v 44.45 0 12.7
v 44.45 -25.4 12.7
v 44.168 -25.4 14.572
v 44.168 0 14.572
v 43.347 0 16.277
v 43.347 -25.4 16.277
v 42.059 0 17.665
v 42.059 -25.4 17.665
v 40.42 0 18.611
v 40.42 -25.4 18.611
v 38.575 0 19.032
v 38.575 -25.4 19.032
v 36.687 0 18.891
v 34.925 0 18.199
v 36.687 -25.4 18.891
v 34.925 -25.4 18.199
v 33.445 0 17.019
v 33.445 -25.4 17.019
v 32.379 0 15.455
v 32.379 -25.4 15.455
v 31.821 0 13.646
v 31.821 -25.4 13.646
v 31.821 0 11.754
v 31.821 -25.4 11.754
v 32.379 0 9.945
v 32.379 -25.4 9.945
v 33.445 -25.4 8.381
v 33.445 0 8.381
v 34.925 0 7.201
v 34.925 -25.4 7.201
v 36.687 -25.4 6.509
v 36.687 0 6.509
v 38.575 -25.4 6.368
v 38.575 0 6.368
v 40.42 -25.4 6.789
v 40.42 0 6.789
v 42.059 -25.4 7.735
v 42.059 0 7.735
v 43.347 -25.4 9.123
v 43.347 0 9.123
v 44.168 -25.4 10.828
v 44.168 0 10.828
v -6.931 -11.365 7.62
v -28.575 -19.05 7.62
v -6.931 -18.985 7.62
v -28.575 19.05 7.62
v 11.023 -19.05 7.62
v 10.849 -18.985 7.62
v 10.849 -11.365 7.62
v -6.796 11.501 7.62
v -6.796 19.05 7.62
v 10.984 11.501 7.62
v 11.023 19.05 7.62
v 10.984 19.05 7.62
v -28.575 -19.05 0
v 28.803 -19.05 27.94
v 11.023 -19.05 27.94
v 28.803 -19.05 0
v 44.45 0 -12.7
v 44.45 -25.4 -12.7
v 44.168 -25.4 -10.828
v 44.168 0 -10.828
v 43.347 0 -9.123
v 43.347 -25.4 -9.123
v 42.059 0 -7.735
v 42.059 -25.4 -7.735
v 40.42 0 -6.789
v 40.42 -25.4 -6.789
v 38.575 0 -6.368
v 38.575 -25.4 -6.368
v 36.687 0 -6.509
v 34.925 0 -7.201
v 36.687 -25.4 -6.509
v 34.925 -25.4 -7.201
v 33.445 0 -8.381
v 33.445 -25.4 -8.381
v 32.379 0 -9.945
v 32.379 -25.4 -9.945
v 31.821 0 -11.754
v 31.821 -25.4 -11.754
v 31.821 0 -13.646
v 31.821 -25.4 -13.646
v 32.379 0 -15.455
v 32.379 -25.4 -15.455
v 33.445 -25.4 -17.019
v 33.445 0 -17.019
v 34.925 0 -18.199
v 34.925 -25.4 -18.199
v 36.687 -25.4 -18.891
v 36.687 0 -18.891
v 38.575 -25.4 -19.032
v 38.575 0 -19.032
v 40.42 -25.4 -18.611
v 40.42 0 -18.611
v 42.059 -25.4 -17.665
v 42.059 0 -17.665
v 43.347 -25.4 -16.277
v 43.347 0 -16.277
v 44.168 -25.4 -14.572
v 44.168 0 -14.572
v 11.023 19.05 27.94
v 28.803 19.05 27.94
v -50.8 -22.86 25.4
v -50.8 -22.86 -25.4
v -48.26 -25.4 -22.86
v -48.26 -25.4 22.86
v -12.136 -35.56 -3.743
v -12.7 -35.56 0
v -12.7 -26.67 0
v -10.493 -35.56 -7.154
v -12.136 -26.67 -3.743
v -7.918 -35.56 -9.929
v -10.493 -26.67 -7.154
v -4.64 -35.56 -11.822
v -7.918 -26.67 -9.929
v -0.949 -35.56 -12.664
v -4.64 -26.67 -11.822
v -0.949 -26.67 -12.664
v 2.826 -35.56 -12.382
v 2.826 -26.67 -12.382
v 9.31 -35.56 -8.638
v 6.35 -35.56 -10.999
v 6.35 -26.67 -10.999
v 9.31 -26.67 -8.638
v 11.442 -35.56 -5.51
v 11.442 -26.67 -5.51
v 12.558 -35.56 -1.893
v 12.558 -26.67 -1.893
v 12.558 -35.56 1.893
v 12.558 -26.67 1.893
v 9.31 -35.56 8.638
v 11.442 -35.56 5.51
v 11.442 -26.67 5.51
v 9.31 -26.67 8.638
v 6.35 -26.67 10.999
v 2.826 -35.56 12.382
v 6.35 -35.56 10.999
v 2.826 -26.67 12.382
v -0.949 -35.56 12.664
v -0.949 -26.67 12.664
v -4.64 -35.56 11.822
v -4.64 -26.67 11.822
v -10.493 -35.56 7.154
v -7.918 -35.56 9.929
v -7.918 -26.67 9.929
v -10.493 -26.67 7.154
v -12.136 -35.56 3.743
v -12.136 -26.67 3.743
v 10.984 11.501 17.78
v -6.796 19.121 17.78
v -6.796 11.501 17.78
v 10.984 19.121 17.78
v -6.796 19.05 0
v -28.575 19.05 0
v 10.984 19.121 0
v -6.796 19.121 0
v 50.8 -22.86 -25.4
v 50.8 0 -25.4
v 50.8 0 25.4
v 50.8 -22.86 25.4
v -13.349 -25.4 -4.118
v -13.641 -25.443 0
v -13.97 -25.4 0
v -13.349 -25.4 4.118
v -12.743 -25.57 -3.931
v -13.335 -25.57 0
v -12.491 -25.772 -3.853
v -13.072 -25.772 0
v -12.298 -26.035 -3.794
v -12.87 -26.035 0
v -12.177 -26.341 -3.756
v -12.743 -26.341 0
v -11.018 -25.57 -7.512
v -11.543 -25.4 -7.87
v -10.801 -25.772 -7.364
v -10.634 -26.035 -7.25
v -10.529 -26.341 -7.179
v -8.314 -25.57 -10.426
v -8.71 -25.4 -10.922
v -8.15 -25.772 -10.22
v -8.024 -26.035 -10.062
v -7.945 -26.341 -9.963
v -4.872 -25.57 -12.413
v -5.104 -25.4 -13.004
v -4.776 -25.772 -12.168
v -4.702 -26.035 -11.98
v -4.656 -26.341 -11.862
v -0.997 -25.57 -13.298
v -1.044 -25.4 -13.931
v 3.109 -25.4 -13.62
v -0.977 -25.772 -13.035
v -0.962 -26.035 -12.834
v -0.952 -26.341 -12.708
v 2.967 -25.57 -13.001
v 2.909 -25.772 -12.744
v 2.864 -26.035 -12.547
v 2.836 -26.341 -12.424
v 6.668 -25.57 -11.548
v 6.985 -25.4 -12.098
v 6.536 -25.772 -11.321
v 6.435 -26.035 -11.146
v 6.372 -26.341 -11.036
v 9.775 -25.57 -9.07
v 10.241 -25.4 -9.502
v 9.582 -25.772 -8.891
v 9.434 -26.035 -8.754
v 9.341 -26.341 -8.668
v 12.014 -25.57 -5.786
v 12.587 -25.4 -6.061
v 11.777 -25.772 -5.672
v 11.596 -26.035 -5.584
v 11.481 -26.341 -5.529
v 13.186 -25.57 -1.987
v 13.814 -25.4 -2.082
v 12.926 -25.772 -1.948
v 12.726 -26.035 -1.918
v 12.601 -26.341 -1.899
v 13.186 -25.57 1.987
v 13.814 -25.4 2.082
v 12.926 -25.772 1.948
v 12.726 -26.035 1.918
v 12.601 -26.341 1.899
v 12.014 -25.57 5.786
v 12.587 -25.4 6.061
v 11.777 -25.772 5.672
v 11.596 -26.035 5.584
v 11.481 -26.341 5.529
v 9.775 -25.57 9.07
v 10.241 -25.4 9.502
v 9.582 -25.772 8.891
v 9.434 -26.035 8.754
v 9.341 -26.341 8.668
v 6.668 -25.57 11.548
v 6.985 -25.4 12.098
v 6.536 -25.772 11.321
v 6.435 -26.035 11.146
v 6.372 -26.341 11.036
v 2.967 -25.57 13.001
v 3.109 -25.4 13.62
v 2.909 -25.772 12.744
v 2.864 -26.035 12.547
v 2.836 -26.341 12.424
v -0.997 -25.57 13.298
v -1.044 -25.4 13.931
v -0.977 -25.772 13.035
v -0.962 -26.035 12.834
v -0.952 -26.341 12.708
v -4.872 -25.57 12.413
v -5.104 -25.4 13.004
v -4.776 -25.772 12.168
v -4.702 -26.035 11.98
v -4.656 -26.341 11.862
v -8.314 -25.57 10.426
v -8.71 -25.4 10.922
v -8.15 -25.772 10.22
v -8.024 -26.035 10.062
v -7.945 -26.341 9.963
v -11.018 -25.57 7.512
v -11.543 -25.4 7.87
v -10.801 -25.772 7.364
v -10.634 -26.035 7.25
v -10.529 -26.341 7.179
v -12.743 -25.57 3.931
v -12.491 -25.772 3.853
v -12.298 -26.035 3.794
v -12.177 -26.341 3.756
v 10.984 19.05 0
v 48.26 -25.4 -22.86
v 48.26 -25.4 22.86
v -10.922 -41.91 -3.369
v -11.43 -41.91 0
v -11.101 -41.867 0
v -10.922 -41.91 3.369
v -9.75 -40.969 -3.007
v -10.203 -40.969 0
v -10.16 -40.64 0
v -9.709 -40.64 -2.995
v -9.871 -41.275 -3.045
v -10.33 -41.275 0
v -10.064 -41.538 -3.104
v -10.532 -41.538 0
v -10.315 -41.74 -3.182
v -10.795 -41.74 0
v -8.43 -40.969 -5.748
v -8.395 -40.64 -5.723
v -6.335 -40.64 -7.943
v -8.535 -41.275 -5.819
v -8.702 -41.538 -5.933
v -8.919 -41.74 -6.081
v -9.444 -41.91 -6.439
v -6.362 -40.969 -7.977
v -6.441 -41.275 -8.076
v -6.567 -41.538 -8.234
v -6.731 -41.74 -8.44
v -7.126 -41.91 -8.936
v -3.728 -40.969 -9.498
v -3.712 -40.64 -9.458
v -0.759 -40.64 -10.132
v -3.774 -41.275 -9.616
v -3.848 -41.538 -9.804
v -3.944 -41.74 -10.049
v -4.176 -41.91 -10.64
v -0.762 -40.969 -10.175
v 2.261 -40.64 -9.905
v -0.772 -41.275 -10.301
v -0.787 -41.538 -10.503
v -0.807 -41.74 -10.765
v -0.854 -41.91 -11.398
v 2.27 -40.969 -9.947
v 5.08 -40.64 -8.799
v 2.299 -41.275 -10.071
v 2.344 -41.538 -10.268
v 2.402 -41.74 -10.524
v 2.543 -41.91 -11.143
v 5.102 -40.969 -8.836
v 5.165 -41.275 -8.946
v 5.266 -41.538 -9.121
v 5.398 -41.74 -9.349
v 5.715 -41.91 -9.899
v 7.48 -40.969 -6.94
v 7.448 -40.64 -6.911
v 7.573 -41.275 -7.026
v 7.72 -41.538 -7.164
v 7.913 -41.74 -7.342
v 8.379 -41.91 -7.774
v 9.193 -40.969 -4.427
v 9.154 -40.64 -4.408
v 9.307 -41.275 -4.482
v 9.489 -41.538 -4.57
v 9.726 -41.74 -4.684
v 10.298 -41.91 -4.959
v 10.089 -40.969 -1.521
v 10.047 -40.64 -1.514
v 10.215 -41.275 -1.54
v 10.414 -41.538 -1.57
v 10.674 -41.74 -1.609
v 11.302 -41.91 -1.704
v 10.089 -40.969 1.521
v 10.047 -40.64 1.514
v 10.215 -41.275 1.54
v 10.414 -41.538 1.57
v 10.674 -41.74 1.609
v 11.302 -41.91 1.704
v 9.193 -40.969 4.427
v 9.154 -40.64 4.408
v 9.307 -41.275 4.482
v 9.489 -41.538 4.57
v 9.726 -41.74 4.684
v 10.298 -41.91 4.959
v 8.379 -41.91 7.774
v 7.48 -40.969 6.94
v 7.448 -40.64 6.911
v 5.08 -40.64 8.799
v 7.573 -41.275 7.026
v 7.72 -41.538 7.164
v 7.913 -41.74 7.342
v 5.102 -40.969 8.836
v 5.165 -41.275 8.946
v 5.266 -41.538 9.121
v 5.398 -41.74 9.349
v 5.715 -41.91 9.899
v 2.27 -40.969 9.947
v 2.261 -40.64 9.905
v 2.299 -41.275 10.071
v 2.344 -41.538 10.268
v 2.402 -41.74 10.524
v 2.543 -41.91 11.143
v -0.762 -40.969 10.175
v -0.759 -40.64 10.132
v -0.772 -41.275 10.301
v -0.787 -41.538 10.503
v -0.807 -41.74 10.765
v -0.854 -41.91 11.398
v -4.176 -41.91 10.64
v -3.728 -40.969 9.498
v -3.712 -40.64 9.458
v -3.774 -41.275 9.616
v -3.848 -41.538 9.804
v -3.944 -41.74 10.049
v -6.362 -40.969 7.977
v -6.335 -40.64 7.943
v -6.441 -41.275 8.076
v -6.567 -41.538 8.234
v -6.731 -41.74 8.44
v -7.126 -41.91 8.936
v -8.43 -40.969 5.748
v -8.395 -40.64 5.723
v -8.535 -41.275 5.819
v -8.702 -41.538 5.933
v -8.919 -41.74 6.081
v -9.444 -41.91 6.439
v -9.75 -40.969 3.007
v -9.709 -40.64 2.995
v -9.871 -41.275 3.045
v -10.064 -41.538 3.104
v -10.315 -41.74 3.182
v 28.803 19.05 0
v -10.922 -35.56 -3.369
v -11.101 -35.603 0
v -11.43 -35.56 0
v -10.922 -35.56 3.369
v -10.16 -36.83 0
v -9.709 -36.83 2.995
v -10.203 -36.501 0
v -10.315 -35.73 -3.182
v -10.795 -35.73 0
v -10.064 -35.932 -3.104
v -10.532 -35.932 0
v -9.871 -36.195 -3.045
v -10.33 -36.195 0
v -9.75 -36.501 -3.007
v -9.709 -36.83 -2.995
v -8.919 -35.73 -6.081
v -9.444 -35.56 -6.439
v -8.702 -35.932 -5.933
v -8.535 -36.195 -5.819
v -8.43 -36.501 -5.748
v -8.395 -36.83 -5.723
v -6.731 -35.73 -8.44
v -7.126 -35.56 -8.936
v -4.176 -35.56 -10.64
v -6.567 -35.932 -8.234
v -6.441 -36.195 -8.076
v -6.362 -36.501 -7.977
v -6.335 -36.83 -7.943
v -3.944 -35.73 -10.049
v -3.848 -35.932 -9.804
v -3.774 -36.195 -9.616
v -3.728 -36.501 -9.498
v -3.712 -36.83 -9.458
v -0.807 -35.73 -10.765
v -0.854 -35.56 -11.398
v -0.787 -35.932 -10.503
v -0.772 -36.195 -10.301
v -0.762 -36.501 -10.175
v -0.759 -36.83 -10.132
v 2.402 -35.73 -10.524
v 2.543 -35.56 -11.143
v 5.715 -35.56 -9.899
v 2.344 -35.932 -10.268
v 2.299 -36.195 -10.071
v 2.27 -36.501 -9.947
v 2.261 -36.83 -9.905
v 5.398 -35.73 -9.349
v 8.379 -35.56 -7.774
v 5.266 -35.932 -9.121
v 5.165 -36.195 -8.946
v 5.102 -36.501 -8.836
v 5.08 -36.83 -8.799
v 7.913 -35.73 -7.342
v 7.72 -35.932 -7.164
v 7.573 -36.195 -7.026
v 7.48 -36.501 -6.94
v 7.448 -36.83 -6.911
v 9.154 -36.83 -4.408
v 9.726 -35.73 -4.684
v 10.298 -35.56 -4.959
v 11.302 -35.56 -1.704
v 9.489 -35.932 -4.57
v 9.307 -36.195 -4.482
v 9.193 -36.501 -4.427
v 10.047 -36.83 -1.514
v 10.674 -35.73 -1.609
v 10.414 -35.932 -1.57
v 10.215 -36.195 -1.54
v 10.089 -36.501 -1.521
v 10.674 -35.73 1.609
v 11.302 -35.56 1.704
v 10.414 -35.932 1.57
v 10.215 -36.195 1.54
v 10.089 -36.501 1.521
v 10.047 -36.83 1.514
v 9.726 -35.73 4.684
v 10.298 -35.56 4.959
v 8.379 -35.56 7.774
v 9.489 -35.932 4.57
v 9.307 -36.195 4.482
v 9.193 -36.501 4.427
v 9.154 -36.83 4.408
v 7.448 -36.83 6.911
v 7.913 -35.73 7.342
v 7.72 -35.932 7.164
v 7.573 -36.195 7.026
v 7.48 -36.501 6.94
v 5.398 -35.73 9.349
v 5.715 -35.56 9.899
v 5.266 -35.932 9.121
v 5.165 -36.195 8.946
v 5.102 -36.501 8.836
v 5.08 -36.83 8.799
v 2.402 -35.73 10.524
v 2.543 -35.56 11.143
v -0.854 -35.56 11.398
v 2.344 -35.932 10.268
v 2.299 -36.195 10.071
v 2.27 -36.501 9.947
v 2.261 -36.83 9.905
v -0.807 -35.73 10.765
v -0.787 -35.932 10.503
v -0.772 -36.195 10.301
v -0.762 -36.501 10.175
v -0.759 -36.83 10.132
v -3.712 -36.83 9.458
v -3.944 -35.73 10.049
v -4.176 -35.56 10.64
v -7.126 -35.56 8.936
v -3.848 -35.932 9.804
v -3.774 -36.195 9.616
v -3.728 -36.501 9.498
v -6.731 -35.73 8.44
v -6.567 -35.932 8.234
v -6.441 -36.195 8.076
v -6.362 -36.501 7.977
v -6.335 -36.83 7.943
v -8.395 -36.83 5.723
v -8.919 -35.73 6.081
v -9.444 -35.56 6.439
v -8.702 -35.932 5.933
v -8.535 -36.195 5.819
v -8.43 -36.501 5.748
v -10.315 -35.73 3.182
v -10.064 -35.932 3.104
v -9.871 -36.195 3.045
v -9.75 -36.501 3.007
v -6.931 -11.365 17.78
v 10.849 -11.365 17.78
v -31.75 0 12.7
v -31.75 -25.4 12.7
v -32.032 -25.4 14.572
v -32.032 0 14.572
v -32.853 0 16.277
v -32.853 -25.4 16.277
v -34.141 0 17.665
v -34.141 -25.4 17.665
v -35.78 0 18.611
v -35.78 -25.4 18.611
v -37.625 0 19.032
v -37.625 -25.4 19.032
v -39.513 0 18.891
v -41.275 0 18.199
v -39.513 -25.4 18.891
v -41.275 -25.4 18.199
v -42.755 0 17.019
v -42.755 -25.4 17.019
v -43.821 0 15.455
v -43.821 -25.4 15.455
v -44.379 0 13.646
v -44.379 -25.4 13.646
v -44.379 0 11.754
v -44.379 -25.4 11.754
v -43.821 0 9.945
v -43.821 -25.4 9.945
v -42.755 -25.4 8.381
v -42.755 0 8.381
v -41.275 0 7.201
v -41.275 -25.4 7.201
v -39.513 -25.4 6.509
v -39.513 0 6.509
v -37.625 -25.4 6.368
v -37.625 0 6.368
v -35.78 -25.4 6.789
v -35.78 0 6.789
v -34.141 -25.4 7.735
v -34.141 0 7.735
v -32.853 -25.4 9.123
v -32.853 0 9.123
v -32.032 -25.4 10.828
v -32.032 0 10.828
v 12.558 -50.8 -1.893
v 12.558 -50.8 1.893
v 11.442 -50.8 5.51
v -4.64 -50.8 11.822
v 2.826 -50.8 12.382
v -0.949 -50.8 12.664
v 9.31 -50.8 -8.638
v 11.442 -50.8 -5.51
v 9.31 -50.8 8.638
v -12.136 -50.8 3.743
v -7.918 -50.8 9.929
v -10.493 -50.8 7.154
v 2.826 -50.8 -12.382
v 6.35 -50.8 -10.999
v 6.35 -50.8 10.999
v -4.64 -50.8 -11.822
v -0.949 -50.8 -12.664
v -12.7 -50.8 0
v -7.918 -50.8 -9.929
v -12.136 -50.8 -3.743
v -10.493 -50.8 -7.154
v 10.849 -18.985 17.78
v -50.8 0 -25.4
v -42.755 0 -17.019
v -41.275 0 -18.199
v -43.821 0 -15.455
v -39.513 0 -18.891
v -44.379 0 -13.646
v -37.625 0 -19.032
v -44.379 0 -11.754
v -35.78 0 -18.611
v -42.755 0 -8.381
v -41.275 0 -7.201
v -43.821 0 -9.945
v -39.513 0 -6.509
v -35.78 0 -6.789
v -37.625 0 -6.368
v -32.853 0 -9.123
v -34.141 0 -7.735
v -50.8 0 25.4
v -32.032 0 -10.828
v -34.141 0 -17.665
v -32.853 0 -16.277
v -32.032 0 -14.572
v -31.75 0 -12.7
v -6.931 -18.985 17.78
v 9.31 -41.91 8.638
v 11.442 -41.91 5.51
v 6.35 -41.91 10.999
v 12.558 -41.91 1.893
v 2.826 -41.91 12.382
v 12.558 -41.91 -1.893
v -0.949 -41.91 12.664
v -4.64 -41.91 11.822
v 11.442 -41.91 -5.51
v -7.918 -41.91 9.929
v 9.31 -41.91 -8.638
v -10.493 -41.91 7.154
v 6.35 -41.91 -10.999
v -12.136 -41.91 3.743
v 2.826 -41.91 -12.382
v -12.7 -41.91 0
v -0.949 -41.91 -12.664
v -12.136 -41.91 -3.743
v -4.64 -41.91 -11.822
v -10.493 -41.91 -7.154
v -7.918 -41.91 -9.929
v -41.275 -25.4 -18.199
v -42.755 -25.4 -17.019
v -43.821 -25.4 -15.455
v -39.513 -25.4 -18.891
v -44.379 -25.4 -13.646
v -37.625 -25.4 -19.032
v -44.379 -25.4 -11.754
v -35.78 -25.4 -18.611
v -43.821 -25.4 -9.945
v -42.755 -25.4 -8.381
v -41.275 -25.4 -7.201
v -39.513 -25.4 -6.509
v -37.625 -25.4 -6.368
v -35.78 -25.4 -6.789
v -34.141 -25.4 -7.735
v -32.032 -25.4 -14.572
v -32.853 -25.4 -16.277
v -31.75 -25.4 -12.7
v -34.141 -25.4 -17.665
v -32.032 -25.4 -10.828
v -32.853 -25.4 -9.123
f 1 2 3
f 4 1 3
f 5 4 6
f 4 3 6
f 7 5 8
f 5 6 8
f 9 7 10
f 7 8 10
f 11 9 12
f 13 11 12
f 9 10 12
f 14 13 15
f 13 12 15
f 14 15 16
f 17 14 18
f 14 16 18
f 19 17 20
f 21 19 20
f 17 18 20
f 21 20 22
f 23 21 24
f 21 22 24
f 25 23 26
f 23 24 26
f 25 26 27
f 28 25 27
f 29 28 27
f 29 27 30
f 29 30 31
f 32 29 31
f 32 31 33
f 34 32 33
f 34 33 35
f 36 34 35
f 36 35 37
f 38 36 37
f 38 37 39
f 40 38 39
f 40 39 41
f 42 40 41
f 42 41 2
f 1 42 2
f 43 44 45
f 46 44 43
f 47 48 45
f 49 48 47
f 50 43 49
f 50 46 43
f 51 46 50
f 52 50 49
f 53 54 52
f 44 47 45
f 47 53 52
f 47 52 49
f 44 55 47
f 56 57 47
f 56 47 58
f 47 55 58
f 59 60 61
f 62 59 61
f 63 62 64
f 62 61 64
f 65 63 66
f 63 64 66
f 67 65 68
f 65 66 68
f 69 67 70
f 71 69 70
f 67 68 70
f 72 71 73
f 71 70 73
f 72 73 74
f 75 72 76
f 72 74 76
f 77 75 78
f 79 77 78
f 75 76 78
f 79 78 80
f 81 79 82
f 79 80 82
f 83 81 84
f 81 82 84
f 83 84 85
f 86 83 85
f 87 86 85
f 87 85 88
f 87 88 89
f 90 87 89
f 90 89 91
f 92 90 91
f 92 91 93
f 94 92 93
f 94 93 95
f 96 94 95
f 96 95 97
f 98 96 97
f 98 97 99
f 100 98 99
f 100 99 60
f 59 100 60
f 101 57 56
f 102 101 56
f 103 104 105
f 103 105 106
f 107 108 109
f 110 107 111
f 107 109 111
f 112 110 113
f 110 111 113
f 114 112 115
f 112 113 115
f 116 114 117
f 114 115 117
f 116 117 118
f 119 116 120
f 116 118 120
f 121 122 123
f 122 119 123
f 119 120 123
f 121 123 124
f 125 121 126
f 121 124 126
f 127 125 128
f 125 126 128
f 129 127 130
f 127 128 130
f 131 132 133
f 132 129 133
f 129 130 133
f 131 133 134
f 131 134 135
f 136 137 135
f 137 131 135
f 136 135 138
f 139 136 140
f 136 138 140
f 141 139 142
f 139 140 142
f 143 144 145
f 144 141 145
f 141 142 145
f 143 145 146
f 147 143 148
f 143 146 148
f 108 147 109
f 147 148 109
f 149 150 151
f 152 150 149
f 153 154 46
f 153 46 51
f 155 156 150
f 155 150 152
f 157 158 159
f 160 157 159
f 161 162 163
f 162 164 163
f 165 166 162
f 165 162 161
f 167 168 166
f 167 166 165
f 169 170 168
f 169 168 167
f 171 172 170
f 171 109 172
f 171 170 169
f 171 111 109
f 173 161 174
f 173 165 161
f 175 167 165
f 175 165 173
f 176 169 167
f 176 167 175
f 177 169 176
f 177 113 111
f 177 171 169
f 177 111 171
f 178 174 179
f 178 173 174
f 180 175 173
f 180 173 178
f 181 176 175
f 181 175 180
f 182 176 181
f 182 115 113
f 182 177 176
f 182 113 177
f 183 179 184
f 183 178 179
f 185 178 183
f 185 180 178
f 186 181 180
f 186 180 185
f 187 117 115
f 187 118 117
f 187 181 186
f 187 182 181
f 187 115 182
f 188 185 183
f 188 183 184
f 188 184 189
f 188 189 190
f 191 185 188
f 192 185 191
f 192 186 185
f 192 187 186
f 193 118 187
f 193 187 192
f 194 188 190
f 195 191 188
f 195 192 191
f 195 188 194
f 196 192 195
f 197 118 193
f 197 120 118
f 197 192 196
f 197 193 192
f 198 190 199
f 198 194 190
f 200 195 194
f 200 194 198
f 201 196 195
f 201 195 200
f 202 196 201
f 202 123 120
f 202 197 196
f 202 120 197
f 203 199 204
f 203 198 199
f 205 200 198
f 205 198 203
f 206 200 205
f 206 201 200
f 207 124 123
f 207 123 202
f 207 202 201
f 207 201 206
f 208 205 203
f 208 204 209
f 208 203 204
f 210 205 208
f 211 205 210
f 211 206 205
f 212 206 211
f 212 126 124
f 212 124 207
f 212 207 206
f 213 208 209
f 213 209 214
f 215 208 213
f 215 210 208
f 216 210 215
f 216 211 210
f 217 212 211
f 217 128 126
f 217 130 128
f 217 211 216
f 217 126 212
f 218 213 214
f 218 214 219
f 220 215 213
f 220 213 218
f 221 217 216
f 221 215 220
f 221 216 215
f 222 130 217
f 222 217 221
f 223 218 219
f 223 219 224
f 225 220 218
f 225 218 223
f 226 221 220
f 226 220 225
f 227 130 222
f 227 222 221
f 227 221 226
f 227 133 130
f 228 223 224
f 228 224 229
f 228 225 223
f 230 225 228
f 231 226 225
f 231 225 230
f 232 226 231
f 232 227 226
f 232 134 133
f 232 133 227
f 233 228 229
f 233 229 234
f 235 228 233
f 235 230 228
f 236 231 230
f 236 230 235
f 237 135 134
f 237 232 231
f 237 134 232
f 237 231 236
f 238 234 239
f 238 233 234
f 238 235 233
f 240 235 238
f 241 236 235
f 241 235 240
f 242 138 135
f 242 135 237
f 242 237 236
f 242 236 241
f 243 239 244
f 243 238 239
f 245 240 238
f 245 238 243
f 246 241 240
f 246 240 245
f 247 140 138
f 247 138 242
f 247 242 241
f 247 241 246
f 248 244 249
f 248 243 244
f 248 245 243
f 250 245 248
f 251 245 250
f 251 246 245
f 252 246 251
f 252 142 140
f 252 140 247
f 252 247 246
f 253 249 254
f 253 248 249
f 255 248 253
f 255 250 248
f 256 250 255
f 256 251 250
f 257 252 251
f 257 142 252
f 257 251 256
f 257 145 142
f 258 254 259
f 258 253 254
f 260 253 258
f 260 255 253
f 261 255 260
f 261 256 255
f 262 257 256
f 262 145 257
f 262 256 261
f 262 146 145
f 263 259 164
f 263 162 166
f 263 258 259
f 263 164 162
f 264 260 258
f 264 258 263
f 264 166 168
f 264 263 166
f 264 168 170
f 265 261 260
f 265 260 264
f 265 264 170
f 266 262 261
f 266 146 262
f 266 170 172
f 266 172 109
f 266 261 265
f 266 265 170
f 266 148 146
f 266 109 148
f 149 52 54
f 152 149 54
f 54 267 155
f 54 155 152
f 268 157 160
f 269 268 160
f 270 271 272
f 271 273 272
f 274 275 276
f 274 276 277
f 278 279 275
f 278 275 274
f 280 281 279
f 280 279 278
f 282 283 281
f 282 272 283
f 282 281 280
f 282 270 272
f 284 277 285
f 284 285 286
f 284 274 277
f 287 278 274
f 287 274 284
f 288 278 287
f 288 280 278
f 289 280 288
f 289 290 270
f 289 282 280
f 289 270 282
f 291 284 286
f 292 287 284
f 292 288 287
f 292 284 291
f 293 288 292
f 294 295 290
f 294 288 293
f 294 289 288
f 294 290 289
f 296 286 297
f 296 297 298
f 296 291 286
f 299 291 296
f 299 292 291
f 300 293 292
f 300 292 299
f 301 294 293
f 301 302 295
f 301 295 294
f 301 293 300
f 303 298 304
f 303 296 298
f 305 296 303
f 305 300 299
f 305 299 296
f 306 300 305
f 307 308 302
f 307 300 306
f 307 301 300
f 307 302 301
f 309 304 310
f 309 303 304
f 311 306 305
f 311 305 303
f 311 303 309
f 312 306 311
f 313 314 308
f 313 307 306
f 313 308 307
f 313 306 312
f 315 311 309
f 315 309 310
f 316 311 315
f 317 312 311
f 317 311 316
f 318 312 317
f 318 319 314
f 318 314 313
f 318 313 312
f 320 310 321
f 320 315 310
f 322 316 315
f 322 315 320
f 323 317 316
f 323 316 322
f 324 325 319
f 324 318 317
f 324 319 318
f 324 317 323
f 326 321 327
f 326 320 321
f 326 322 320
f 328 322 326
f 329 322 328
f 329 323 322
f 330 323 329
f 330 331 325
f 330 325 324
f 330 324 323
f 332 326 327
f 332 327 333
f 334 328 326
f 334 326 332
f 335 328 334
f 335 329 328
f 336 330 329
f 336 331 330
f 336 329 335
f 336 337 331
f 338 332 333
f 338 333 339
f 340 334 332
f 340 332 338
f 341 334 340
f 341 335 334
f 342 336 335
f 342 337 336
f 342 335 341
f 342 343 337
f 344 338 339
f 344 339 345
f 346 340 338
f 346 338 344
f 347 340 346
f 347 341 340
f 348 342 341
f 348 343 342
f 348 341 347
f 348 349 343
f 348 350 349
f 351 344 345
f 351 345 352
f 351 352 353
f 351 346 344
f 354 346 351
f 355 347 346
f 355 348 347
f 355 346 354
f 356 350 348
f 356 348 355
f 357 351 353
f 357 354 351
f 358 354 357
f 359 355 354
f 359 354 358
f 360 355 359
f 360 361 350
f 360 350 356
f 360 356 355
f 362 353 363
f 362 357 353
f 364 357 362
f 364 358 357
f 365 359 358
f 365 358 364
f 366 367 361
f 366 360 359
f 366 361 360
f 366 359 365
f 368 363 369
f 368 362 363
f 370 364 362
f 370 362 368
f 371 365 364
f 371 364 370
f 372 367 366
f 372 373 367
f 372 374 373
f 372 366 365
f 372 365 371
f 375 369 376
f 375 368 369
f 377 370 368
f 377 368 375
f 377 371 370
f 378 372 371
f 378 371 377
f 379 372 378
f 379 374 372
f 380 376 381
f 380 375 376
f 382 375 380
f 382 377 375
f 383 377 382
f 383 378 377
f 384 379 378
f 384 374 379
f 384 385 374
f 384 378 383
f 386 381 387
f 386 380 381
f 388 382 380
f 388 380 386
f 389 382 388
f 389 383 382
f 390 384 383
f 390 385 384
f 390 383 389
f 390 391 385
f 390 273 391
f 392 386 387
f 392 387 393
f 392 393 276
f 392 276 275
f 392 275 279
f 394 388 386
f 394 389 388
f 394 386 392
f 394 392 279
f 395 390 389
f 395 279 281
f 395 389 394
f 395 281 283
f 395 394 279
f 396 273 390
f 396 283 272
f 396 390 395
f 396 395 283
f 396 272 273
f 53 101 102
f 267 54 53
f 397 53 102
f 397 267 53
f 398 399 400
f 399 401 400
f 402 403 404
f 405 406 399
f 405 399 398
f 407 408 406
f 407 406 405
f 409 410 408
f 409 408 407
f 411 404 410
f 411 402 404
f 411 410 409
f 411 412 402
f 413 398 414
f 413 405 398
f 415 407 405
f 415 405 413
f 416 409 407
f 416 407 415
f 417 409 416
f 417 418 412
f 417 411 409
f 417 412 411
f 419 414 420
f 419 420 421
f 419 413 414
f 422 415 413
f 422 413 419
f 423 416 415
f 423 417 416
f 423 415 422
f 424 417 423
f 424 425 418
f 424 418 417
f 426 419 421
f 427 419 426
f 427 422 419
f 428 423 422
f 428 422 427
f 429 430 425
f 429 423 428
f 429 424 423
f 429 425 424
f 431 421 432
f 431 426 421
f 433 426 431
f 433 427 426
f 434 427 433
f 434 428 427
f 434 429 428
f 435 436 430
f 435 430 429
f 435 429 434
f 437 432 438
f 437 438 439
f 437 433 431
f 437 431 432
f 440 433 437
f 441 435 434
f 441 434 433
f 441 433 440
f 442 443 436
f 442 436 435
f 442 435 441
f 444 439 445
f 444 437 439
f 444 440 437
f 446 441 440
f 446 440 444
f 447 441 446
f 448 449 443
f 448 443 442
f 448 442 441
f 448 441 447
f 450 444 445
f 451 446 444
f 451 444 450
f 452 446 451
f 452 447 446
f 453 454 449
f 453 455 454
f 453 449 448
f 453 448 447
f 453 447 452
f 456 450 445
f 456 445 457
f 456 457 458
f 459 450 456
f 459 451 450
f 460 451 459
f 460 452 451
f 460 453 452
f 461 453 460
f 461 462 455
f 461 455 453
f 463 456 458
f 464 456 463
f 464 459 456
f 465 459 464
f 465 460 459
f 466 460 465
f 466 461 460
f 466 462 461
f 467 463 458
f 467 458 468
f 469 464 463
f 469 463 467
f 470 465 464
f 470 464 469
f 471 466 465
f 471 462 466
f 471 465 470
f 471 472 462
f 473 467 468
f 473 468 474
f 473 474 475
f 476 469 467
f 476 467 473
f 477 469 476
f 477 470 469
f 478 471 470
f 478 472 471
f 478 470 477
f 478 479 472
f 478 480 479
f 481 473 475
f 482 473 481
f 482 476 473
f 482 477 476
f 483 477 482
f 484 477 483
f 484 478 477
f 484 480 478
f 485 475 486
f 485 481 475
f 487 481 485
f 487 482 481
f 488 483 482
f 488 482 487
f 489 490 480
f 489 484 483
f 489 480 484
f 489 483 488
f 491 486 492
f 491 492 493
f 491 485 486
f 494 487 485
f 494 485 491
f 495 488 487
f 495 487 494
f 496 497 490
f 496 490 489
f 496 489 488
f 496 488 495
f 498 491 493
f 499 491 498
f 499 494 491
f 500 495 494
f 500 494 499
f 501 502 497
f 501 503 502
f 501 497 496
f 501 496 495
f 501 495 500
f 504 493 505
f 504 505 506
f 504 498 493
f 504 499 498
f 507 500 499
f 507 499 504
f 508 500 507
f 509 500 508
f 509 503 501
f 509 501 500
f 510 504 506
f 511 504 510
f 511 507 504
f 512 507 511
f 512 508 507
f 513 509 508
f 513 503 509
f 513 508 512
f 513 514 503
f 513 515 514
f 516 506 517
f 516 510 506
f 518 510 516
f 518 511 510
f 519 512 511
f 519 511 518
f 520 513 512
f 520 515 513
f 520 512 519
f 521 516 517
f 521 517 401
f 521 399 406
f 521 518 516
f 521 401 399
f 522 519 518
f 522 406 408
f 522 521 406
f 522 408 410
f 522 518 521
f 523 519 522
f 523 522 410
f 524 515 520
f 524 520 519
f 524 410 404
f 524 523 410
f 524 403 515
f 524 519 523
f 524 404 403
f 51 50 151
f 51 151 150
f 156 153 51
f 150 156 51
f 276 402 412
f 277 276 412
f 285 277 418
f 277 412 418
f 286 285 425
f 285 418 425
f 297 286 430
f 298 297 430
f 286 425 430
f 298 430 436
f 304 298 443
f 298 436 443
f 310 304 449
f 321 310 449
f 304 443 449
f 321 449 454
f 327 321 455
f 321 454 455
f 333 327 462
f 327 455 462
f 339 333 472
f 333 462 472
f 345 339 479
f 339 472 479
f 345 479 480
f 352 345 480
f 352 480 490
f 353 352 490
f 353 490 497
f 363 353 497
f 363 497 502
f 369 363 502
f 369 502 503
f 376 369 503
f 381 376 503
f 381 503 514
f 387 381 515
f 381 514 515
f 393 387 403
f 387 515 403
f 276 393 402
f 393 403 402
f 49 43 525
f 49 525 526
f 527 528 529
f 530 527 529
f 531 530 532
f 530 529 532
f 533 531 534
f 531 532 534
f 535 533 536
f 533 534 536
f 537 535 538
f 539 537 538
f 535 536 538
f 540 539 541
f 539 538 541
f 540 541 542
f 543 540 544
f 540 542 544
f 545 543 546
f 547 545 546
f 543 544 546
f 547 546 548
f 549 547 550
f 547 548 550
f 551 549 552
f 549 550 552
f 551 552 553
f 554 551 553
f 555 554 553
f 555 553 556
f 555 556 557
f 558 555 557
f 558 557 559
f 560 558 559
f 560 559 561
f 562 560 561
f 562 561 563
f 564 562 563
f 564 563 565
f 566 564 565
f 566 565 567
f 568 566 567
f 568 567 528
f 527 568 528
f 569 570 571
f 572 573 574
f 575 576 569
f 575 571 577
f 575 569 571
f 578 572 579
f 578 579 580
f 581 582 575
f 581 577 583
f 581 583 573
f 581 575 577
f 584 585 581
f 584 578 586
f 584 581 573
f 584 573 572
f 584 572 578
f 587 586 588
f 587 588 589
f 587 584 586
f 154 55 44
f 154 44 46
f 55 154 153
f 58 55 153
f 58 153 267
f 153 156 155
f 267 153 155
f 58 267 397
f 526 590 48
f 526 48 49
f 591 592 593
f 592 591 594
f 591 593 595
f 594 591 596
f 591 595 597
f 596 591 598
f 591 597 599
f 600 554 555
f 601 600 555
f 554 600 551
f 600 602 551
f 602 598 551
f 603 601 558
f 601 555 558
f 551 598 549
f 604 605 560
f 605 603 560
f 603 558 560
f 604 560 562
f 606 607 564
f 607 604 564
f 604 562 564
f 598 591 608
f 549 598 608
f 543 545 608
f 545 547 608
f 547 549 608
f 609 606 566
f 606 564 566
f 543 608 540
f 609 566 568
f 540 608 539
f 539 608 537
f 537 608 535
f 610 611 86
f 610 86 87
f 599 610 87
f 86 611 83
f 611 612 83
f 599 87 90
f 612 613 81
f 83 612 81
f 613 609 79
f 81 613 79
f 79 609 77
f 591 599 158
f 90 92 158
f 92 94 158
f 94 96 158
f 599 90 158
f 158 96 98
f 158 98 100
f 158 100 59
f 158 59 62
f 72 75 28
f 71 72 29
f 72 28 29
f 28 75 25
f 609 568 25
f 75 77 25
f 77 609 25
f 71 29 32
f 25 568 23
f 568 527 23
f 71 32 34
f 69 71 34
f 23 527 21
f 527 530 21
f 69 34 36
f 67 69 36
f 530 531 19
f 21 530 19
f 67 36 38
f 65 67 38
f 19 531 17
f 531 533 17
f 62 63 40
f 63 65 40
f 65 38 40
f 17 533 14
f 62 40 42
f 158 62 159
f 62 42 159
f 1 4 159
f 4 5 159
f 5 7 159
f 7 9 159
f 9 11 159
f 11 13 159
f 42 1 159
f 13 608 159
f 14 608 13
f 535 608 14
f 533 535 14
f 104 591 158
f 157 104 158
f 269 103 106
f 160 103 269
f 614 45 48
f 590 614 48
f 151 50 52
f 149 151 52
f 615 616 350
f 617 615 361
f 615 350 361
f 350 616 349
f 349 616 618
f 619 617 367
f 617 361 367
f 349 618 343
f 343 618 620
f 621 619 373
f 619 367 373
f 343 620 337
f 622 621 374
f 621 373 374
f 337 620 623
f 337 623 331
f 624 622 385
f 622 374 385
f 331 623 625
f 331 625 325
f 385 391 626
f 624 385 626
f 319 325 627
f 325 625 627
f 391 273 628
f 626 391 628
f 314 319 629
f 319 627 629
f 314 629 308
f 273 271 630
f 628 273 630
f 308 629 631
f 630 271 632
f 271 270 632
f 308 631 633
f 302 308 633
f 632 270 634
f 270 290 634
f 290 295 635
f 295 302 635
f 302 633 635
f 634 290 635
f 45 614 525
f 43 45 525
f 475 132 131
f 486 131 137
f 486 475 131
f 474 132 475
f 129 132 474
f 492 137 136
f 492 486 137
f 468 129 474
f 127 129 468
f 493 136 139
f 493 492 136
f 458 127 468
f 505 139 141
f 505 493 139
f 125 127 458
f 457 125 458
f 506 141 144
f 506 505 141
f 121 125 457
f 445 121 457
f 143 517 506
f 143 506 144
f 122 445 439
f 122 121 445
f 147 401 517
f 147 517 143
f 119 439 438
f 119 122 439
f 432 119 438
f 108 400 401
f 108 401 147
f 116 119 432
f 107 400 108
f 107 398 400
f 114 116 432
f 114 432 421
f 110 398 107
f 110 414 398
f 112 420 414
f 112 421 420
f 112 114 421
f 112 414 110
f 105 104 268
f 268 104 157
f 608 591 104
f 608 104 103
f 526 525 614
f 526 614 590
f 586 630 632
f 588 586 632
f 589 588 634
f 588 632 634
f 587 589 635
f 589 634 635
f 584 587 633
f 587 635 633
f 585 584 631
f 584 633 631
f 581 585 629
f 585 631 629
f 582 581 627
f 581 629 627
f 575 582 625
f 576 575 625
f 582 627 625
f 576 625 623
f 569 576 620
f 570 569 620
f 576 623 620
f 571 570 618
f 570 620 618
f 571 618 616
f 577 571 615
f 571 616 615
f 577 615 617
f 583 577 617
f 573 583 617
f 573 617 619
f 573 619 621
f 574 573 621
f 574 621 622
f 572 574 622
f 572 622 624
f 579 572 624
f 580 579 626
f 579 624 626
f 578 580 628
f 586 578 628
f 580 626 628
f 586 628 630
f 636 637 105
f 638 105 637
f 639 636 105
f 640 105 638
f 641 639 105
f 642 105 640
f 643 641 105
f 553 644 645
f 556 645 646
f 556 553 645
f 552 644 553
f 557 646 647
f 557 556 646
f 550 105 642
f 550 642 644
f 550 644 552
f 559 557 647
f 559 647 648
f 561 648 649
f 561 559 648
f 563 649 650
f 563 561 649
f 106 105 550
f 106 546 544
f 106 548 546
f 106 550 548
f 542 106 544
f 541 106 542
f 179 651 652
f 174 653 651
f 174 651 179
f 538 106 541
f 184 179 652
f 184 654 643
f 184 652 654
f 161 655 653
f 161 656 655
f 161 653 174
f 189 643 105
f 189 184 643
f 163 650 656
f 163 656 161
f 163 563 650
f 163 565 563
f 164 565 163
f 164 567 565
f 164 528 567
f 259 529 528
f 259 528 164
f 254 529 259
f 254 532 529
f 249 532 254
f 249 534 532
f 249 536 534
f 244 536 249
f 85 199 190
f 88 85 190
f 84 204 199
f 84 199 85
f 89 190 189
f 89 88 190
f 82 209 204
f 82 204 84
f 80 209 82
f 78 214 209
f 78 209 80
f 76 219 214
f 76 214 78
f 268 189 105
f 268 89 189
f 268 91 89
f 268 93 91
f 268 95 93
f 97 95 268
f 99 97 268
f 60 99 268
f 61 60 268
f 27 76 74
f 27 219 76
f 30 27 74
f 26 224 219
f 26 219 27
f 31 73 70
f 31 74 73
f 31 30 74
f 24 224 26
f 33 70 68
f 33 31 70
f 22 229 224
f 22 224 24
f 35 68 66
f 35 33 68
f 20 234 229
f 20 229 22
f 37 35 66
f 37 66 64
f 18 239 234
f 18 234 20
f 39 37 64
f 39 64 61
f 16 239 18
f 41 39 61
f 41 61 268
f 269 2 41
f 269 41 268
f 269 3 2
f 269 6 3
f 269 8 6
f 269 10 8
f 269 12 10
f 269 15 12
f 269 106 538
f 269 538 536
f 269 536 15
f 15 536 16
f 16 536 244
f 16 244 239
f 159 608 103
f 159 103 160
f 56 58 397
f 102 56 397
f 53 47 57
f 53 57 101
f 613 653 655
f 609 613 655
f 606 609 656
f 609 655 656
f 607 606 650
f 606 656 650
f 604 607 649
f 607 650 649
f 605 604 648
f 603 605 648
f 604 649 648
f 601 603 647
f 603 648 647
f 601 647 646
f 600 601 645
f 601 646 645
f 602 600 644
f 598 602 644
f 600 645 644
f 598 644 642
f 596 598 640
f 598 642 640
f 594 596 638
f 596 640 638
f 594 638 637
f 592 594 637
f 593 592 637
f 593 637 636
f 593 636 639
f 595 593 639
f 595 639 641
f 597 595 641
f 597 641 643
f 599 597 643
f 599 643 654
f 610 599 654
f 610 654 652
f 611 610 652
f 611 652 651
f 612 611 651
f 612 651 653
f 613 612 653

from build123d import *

# Parameters (mm, degrees)
F0_W      = 101.6
F0_H      = 50.8
F1_DEPTH  = 25.4
F2_R      = 6.35
F3_DEPTH  = 25.401
F4_W      = 12.7
F4_H      = 25.4
F6_W      = 5.7951804488
F6_H      = 6.35
F8_R      = 1.27
F9_SIZE   = 2.54
F10_W     = 57.15
F10_H     = 38.1
F11_DEPTH = 7.62
F12_W     = 17.78
F12_H     = 38.1
F13_DEPTH = 27.94
F14_W     = 17.78
F14_H     = 7.62
F15_DEPTH = 17.78


with BuildPart() as f1:
    # F0 (on Front) → F1 (new body)
    with BuildSketch(Plane.XZ):
        Rectangle(F0_W, F0_H)
    extrude(amount=F1_DEPTH)

    # F2 (on face) → F3 (cut, through all)
    with BuildSketch(Plane.XZ.offset(25.4)):
        with Locations((-38.1, 12.7)):
            Circle(F2_R)
        with Locations((-38.1, -12.7)):
            Circle(F2_R)
        with Locations((38.1, 12.7)):
            Circle(F2_R)
        with Locations((38.1, -12.7)):
            Circle(F2_R)
    extrude(amount=-F3_DEPTH, mode=Mode.SUBTRACT)

    # F4 (on Top) → F5 (revolve)
    with BuildSketch(Plane.XY):
        with Locations((-6.35, -38.1)):
            Rectangle(F4_W, F4_H)
    revolve(axis=Axis((0, -38.1, 0), (0, -1, 0)))

    # F6 (on Top) → F7 (revolve, cut)
    with BuildSketch(Plane.XY):
        with Locations((-13.0575902244, -38.735)):
            Rectangle(F6_W, F6_H)
    revolve(axis=Axis((0, -9.0271439403, 0), (0, -1, 0)), mode=Mode.SUBTRACT)

    # F8
    f8_edges = [f1.edges().sort_by_distance(p)[0] for p in [
        (12.7, -25.4, 0),
        (10.16, -41.91, 0),
        (10.16, -35.56, 0),
    ]]
    fillet(f8_edges, radius=F8_R)

    # F9
    f9_edges = [f1.edges().sort_by_distance(p)[0] for p in [
        (0, -25.4, -25.4),
        (-50.8, -25.4, 0),
        (0, -25.4, 25.4),
        (50.8, -25.4, 0),
    ]]
    chamfer(f9_edges, length=F9_SIZE)


with BuildPart() as f11:
    # F10 (on Top) → F11 (new body)
    with BuildSketch(Plane.XY):
        Rectangle(F10_W, F10_H)
    extrude(amount=F11_DEPTH)

    # F12 (on Top) → F13 (join)
    with BuildSketch(Plane.XY):
        with Locations((19.9131323025, 0)):
            Rectangle(F12_W, F12_H)
    extrude(amount=F13_DEPTH)

    # F14 (on Top) → F15 (join)
    with BuildSketch(Plane.XY):
        with Locations((2.094425433, 15.3110322082)):
            Rectangle(F14_W, F14_H)
        with Locations((1.9588155529, -15.1754241908)):
            Rectangle(F14_W, F14_H)
    extrude(amount=F15_DEPTH)


solid = Compound([f1.part, f11.part])
